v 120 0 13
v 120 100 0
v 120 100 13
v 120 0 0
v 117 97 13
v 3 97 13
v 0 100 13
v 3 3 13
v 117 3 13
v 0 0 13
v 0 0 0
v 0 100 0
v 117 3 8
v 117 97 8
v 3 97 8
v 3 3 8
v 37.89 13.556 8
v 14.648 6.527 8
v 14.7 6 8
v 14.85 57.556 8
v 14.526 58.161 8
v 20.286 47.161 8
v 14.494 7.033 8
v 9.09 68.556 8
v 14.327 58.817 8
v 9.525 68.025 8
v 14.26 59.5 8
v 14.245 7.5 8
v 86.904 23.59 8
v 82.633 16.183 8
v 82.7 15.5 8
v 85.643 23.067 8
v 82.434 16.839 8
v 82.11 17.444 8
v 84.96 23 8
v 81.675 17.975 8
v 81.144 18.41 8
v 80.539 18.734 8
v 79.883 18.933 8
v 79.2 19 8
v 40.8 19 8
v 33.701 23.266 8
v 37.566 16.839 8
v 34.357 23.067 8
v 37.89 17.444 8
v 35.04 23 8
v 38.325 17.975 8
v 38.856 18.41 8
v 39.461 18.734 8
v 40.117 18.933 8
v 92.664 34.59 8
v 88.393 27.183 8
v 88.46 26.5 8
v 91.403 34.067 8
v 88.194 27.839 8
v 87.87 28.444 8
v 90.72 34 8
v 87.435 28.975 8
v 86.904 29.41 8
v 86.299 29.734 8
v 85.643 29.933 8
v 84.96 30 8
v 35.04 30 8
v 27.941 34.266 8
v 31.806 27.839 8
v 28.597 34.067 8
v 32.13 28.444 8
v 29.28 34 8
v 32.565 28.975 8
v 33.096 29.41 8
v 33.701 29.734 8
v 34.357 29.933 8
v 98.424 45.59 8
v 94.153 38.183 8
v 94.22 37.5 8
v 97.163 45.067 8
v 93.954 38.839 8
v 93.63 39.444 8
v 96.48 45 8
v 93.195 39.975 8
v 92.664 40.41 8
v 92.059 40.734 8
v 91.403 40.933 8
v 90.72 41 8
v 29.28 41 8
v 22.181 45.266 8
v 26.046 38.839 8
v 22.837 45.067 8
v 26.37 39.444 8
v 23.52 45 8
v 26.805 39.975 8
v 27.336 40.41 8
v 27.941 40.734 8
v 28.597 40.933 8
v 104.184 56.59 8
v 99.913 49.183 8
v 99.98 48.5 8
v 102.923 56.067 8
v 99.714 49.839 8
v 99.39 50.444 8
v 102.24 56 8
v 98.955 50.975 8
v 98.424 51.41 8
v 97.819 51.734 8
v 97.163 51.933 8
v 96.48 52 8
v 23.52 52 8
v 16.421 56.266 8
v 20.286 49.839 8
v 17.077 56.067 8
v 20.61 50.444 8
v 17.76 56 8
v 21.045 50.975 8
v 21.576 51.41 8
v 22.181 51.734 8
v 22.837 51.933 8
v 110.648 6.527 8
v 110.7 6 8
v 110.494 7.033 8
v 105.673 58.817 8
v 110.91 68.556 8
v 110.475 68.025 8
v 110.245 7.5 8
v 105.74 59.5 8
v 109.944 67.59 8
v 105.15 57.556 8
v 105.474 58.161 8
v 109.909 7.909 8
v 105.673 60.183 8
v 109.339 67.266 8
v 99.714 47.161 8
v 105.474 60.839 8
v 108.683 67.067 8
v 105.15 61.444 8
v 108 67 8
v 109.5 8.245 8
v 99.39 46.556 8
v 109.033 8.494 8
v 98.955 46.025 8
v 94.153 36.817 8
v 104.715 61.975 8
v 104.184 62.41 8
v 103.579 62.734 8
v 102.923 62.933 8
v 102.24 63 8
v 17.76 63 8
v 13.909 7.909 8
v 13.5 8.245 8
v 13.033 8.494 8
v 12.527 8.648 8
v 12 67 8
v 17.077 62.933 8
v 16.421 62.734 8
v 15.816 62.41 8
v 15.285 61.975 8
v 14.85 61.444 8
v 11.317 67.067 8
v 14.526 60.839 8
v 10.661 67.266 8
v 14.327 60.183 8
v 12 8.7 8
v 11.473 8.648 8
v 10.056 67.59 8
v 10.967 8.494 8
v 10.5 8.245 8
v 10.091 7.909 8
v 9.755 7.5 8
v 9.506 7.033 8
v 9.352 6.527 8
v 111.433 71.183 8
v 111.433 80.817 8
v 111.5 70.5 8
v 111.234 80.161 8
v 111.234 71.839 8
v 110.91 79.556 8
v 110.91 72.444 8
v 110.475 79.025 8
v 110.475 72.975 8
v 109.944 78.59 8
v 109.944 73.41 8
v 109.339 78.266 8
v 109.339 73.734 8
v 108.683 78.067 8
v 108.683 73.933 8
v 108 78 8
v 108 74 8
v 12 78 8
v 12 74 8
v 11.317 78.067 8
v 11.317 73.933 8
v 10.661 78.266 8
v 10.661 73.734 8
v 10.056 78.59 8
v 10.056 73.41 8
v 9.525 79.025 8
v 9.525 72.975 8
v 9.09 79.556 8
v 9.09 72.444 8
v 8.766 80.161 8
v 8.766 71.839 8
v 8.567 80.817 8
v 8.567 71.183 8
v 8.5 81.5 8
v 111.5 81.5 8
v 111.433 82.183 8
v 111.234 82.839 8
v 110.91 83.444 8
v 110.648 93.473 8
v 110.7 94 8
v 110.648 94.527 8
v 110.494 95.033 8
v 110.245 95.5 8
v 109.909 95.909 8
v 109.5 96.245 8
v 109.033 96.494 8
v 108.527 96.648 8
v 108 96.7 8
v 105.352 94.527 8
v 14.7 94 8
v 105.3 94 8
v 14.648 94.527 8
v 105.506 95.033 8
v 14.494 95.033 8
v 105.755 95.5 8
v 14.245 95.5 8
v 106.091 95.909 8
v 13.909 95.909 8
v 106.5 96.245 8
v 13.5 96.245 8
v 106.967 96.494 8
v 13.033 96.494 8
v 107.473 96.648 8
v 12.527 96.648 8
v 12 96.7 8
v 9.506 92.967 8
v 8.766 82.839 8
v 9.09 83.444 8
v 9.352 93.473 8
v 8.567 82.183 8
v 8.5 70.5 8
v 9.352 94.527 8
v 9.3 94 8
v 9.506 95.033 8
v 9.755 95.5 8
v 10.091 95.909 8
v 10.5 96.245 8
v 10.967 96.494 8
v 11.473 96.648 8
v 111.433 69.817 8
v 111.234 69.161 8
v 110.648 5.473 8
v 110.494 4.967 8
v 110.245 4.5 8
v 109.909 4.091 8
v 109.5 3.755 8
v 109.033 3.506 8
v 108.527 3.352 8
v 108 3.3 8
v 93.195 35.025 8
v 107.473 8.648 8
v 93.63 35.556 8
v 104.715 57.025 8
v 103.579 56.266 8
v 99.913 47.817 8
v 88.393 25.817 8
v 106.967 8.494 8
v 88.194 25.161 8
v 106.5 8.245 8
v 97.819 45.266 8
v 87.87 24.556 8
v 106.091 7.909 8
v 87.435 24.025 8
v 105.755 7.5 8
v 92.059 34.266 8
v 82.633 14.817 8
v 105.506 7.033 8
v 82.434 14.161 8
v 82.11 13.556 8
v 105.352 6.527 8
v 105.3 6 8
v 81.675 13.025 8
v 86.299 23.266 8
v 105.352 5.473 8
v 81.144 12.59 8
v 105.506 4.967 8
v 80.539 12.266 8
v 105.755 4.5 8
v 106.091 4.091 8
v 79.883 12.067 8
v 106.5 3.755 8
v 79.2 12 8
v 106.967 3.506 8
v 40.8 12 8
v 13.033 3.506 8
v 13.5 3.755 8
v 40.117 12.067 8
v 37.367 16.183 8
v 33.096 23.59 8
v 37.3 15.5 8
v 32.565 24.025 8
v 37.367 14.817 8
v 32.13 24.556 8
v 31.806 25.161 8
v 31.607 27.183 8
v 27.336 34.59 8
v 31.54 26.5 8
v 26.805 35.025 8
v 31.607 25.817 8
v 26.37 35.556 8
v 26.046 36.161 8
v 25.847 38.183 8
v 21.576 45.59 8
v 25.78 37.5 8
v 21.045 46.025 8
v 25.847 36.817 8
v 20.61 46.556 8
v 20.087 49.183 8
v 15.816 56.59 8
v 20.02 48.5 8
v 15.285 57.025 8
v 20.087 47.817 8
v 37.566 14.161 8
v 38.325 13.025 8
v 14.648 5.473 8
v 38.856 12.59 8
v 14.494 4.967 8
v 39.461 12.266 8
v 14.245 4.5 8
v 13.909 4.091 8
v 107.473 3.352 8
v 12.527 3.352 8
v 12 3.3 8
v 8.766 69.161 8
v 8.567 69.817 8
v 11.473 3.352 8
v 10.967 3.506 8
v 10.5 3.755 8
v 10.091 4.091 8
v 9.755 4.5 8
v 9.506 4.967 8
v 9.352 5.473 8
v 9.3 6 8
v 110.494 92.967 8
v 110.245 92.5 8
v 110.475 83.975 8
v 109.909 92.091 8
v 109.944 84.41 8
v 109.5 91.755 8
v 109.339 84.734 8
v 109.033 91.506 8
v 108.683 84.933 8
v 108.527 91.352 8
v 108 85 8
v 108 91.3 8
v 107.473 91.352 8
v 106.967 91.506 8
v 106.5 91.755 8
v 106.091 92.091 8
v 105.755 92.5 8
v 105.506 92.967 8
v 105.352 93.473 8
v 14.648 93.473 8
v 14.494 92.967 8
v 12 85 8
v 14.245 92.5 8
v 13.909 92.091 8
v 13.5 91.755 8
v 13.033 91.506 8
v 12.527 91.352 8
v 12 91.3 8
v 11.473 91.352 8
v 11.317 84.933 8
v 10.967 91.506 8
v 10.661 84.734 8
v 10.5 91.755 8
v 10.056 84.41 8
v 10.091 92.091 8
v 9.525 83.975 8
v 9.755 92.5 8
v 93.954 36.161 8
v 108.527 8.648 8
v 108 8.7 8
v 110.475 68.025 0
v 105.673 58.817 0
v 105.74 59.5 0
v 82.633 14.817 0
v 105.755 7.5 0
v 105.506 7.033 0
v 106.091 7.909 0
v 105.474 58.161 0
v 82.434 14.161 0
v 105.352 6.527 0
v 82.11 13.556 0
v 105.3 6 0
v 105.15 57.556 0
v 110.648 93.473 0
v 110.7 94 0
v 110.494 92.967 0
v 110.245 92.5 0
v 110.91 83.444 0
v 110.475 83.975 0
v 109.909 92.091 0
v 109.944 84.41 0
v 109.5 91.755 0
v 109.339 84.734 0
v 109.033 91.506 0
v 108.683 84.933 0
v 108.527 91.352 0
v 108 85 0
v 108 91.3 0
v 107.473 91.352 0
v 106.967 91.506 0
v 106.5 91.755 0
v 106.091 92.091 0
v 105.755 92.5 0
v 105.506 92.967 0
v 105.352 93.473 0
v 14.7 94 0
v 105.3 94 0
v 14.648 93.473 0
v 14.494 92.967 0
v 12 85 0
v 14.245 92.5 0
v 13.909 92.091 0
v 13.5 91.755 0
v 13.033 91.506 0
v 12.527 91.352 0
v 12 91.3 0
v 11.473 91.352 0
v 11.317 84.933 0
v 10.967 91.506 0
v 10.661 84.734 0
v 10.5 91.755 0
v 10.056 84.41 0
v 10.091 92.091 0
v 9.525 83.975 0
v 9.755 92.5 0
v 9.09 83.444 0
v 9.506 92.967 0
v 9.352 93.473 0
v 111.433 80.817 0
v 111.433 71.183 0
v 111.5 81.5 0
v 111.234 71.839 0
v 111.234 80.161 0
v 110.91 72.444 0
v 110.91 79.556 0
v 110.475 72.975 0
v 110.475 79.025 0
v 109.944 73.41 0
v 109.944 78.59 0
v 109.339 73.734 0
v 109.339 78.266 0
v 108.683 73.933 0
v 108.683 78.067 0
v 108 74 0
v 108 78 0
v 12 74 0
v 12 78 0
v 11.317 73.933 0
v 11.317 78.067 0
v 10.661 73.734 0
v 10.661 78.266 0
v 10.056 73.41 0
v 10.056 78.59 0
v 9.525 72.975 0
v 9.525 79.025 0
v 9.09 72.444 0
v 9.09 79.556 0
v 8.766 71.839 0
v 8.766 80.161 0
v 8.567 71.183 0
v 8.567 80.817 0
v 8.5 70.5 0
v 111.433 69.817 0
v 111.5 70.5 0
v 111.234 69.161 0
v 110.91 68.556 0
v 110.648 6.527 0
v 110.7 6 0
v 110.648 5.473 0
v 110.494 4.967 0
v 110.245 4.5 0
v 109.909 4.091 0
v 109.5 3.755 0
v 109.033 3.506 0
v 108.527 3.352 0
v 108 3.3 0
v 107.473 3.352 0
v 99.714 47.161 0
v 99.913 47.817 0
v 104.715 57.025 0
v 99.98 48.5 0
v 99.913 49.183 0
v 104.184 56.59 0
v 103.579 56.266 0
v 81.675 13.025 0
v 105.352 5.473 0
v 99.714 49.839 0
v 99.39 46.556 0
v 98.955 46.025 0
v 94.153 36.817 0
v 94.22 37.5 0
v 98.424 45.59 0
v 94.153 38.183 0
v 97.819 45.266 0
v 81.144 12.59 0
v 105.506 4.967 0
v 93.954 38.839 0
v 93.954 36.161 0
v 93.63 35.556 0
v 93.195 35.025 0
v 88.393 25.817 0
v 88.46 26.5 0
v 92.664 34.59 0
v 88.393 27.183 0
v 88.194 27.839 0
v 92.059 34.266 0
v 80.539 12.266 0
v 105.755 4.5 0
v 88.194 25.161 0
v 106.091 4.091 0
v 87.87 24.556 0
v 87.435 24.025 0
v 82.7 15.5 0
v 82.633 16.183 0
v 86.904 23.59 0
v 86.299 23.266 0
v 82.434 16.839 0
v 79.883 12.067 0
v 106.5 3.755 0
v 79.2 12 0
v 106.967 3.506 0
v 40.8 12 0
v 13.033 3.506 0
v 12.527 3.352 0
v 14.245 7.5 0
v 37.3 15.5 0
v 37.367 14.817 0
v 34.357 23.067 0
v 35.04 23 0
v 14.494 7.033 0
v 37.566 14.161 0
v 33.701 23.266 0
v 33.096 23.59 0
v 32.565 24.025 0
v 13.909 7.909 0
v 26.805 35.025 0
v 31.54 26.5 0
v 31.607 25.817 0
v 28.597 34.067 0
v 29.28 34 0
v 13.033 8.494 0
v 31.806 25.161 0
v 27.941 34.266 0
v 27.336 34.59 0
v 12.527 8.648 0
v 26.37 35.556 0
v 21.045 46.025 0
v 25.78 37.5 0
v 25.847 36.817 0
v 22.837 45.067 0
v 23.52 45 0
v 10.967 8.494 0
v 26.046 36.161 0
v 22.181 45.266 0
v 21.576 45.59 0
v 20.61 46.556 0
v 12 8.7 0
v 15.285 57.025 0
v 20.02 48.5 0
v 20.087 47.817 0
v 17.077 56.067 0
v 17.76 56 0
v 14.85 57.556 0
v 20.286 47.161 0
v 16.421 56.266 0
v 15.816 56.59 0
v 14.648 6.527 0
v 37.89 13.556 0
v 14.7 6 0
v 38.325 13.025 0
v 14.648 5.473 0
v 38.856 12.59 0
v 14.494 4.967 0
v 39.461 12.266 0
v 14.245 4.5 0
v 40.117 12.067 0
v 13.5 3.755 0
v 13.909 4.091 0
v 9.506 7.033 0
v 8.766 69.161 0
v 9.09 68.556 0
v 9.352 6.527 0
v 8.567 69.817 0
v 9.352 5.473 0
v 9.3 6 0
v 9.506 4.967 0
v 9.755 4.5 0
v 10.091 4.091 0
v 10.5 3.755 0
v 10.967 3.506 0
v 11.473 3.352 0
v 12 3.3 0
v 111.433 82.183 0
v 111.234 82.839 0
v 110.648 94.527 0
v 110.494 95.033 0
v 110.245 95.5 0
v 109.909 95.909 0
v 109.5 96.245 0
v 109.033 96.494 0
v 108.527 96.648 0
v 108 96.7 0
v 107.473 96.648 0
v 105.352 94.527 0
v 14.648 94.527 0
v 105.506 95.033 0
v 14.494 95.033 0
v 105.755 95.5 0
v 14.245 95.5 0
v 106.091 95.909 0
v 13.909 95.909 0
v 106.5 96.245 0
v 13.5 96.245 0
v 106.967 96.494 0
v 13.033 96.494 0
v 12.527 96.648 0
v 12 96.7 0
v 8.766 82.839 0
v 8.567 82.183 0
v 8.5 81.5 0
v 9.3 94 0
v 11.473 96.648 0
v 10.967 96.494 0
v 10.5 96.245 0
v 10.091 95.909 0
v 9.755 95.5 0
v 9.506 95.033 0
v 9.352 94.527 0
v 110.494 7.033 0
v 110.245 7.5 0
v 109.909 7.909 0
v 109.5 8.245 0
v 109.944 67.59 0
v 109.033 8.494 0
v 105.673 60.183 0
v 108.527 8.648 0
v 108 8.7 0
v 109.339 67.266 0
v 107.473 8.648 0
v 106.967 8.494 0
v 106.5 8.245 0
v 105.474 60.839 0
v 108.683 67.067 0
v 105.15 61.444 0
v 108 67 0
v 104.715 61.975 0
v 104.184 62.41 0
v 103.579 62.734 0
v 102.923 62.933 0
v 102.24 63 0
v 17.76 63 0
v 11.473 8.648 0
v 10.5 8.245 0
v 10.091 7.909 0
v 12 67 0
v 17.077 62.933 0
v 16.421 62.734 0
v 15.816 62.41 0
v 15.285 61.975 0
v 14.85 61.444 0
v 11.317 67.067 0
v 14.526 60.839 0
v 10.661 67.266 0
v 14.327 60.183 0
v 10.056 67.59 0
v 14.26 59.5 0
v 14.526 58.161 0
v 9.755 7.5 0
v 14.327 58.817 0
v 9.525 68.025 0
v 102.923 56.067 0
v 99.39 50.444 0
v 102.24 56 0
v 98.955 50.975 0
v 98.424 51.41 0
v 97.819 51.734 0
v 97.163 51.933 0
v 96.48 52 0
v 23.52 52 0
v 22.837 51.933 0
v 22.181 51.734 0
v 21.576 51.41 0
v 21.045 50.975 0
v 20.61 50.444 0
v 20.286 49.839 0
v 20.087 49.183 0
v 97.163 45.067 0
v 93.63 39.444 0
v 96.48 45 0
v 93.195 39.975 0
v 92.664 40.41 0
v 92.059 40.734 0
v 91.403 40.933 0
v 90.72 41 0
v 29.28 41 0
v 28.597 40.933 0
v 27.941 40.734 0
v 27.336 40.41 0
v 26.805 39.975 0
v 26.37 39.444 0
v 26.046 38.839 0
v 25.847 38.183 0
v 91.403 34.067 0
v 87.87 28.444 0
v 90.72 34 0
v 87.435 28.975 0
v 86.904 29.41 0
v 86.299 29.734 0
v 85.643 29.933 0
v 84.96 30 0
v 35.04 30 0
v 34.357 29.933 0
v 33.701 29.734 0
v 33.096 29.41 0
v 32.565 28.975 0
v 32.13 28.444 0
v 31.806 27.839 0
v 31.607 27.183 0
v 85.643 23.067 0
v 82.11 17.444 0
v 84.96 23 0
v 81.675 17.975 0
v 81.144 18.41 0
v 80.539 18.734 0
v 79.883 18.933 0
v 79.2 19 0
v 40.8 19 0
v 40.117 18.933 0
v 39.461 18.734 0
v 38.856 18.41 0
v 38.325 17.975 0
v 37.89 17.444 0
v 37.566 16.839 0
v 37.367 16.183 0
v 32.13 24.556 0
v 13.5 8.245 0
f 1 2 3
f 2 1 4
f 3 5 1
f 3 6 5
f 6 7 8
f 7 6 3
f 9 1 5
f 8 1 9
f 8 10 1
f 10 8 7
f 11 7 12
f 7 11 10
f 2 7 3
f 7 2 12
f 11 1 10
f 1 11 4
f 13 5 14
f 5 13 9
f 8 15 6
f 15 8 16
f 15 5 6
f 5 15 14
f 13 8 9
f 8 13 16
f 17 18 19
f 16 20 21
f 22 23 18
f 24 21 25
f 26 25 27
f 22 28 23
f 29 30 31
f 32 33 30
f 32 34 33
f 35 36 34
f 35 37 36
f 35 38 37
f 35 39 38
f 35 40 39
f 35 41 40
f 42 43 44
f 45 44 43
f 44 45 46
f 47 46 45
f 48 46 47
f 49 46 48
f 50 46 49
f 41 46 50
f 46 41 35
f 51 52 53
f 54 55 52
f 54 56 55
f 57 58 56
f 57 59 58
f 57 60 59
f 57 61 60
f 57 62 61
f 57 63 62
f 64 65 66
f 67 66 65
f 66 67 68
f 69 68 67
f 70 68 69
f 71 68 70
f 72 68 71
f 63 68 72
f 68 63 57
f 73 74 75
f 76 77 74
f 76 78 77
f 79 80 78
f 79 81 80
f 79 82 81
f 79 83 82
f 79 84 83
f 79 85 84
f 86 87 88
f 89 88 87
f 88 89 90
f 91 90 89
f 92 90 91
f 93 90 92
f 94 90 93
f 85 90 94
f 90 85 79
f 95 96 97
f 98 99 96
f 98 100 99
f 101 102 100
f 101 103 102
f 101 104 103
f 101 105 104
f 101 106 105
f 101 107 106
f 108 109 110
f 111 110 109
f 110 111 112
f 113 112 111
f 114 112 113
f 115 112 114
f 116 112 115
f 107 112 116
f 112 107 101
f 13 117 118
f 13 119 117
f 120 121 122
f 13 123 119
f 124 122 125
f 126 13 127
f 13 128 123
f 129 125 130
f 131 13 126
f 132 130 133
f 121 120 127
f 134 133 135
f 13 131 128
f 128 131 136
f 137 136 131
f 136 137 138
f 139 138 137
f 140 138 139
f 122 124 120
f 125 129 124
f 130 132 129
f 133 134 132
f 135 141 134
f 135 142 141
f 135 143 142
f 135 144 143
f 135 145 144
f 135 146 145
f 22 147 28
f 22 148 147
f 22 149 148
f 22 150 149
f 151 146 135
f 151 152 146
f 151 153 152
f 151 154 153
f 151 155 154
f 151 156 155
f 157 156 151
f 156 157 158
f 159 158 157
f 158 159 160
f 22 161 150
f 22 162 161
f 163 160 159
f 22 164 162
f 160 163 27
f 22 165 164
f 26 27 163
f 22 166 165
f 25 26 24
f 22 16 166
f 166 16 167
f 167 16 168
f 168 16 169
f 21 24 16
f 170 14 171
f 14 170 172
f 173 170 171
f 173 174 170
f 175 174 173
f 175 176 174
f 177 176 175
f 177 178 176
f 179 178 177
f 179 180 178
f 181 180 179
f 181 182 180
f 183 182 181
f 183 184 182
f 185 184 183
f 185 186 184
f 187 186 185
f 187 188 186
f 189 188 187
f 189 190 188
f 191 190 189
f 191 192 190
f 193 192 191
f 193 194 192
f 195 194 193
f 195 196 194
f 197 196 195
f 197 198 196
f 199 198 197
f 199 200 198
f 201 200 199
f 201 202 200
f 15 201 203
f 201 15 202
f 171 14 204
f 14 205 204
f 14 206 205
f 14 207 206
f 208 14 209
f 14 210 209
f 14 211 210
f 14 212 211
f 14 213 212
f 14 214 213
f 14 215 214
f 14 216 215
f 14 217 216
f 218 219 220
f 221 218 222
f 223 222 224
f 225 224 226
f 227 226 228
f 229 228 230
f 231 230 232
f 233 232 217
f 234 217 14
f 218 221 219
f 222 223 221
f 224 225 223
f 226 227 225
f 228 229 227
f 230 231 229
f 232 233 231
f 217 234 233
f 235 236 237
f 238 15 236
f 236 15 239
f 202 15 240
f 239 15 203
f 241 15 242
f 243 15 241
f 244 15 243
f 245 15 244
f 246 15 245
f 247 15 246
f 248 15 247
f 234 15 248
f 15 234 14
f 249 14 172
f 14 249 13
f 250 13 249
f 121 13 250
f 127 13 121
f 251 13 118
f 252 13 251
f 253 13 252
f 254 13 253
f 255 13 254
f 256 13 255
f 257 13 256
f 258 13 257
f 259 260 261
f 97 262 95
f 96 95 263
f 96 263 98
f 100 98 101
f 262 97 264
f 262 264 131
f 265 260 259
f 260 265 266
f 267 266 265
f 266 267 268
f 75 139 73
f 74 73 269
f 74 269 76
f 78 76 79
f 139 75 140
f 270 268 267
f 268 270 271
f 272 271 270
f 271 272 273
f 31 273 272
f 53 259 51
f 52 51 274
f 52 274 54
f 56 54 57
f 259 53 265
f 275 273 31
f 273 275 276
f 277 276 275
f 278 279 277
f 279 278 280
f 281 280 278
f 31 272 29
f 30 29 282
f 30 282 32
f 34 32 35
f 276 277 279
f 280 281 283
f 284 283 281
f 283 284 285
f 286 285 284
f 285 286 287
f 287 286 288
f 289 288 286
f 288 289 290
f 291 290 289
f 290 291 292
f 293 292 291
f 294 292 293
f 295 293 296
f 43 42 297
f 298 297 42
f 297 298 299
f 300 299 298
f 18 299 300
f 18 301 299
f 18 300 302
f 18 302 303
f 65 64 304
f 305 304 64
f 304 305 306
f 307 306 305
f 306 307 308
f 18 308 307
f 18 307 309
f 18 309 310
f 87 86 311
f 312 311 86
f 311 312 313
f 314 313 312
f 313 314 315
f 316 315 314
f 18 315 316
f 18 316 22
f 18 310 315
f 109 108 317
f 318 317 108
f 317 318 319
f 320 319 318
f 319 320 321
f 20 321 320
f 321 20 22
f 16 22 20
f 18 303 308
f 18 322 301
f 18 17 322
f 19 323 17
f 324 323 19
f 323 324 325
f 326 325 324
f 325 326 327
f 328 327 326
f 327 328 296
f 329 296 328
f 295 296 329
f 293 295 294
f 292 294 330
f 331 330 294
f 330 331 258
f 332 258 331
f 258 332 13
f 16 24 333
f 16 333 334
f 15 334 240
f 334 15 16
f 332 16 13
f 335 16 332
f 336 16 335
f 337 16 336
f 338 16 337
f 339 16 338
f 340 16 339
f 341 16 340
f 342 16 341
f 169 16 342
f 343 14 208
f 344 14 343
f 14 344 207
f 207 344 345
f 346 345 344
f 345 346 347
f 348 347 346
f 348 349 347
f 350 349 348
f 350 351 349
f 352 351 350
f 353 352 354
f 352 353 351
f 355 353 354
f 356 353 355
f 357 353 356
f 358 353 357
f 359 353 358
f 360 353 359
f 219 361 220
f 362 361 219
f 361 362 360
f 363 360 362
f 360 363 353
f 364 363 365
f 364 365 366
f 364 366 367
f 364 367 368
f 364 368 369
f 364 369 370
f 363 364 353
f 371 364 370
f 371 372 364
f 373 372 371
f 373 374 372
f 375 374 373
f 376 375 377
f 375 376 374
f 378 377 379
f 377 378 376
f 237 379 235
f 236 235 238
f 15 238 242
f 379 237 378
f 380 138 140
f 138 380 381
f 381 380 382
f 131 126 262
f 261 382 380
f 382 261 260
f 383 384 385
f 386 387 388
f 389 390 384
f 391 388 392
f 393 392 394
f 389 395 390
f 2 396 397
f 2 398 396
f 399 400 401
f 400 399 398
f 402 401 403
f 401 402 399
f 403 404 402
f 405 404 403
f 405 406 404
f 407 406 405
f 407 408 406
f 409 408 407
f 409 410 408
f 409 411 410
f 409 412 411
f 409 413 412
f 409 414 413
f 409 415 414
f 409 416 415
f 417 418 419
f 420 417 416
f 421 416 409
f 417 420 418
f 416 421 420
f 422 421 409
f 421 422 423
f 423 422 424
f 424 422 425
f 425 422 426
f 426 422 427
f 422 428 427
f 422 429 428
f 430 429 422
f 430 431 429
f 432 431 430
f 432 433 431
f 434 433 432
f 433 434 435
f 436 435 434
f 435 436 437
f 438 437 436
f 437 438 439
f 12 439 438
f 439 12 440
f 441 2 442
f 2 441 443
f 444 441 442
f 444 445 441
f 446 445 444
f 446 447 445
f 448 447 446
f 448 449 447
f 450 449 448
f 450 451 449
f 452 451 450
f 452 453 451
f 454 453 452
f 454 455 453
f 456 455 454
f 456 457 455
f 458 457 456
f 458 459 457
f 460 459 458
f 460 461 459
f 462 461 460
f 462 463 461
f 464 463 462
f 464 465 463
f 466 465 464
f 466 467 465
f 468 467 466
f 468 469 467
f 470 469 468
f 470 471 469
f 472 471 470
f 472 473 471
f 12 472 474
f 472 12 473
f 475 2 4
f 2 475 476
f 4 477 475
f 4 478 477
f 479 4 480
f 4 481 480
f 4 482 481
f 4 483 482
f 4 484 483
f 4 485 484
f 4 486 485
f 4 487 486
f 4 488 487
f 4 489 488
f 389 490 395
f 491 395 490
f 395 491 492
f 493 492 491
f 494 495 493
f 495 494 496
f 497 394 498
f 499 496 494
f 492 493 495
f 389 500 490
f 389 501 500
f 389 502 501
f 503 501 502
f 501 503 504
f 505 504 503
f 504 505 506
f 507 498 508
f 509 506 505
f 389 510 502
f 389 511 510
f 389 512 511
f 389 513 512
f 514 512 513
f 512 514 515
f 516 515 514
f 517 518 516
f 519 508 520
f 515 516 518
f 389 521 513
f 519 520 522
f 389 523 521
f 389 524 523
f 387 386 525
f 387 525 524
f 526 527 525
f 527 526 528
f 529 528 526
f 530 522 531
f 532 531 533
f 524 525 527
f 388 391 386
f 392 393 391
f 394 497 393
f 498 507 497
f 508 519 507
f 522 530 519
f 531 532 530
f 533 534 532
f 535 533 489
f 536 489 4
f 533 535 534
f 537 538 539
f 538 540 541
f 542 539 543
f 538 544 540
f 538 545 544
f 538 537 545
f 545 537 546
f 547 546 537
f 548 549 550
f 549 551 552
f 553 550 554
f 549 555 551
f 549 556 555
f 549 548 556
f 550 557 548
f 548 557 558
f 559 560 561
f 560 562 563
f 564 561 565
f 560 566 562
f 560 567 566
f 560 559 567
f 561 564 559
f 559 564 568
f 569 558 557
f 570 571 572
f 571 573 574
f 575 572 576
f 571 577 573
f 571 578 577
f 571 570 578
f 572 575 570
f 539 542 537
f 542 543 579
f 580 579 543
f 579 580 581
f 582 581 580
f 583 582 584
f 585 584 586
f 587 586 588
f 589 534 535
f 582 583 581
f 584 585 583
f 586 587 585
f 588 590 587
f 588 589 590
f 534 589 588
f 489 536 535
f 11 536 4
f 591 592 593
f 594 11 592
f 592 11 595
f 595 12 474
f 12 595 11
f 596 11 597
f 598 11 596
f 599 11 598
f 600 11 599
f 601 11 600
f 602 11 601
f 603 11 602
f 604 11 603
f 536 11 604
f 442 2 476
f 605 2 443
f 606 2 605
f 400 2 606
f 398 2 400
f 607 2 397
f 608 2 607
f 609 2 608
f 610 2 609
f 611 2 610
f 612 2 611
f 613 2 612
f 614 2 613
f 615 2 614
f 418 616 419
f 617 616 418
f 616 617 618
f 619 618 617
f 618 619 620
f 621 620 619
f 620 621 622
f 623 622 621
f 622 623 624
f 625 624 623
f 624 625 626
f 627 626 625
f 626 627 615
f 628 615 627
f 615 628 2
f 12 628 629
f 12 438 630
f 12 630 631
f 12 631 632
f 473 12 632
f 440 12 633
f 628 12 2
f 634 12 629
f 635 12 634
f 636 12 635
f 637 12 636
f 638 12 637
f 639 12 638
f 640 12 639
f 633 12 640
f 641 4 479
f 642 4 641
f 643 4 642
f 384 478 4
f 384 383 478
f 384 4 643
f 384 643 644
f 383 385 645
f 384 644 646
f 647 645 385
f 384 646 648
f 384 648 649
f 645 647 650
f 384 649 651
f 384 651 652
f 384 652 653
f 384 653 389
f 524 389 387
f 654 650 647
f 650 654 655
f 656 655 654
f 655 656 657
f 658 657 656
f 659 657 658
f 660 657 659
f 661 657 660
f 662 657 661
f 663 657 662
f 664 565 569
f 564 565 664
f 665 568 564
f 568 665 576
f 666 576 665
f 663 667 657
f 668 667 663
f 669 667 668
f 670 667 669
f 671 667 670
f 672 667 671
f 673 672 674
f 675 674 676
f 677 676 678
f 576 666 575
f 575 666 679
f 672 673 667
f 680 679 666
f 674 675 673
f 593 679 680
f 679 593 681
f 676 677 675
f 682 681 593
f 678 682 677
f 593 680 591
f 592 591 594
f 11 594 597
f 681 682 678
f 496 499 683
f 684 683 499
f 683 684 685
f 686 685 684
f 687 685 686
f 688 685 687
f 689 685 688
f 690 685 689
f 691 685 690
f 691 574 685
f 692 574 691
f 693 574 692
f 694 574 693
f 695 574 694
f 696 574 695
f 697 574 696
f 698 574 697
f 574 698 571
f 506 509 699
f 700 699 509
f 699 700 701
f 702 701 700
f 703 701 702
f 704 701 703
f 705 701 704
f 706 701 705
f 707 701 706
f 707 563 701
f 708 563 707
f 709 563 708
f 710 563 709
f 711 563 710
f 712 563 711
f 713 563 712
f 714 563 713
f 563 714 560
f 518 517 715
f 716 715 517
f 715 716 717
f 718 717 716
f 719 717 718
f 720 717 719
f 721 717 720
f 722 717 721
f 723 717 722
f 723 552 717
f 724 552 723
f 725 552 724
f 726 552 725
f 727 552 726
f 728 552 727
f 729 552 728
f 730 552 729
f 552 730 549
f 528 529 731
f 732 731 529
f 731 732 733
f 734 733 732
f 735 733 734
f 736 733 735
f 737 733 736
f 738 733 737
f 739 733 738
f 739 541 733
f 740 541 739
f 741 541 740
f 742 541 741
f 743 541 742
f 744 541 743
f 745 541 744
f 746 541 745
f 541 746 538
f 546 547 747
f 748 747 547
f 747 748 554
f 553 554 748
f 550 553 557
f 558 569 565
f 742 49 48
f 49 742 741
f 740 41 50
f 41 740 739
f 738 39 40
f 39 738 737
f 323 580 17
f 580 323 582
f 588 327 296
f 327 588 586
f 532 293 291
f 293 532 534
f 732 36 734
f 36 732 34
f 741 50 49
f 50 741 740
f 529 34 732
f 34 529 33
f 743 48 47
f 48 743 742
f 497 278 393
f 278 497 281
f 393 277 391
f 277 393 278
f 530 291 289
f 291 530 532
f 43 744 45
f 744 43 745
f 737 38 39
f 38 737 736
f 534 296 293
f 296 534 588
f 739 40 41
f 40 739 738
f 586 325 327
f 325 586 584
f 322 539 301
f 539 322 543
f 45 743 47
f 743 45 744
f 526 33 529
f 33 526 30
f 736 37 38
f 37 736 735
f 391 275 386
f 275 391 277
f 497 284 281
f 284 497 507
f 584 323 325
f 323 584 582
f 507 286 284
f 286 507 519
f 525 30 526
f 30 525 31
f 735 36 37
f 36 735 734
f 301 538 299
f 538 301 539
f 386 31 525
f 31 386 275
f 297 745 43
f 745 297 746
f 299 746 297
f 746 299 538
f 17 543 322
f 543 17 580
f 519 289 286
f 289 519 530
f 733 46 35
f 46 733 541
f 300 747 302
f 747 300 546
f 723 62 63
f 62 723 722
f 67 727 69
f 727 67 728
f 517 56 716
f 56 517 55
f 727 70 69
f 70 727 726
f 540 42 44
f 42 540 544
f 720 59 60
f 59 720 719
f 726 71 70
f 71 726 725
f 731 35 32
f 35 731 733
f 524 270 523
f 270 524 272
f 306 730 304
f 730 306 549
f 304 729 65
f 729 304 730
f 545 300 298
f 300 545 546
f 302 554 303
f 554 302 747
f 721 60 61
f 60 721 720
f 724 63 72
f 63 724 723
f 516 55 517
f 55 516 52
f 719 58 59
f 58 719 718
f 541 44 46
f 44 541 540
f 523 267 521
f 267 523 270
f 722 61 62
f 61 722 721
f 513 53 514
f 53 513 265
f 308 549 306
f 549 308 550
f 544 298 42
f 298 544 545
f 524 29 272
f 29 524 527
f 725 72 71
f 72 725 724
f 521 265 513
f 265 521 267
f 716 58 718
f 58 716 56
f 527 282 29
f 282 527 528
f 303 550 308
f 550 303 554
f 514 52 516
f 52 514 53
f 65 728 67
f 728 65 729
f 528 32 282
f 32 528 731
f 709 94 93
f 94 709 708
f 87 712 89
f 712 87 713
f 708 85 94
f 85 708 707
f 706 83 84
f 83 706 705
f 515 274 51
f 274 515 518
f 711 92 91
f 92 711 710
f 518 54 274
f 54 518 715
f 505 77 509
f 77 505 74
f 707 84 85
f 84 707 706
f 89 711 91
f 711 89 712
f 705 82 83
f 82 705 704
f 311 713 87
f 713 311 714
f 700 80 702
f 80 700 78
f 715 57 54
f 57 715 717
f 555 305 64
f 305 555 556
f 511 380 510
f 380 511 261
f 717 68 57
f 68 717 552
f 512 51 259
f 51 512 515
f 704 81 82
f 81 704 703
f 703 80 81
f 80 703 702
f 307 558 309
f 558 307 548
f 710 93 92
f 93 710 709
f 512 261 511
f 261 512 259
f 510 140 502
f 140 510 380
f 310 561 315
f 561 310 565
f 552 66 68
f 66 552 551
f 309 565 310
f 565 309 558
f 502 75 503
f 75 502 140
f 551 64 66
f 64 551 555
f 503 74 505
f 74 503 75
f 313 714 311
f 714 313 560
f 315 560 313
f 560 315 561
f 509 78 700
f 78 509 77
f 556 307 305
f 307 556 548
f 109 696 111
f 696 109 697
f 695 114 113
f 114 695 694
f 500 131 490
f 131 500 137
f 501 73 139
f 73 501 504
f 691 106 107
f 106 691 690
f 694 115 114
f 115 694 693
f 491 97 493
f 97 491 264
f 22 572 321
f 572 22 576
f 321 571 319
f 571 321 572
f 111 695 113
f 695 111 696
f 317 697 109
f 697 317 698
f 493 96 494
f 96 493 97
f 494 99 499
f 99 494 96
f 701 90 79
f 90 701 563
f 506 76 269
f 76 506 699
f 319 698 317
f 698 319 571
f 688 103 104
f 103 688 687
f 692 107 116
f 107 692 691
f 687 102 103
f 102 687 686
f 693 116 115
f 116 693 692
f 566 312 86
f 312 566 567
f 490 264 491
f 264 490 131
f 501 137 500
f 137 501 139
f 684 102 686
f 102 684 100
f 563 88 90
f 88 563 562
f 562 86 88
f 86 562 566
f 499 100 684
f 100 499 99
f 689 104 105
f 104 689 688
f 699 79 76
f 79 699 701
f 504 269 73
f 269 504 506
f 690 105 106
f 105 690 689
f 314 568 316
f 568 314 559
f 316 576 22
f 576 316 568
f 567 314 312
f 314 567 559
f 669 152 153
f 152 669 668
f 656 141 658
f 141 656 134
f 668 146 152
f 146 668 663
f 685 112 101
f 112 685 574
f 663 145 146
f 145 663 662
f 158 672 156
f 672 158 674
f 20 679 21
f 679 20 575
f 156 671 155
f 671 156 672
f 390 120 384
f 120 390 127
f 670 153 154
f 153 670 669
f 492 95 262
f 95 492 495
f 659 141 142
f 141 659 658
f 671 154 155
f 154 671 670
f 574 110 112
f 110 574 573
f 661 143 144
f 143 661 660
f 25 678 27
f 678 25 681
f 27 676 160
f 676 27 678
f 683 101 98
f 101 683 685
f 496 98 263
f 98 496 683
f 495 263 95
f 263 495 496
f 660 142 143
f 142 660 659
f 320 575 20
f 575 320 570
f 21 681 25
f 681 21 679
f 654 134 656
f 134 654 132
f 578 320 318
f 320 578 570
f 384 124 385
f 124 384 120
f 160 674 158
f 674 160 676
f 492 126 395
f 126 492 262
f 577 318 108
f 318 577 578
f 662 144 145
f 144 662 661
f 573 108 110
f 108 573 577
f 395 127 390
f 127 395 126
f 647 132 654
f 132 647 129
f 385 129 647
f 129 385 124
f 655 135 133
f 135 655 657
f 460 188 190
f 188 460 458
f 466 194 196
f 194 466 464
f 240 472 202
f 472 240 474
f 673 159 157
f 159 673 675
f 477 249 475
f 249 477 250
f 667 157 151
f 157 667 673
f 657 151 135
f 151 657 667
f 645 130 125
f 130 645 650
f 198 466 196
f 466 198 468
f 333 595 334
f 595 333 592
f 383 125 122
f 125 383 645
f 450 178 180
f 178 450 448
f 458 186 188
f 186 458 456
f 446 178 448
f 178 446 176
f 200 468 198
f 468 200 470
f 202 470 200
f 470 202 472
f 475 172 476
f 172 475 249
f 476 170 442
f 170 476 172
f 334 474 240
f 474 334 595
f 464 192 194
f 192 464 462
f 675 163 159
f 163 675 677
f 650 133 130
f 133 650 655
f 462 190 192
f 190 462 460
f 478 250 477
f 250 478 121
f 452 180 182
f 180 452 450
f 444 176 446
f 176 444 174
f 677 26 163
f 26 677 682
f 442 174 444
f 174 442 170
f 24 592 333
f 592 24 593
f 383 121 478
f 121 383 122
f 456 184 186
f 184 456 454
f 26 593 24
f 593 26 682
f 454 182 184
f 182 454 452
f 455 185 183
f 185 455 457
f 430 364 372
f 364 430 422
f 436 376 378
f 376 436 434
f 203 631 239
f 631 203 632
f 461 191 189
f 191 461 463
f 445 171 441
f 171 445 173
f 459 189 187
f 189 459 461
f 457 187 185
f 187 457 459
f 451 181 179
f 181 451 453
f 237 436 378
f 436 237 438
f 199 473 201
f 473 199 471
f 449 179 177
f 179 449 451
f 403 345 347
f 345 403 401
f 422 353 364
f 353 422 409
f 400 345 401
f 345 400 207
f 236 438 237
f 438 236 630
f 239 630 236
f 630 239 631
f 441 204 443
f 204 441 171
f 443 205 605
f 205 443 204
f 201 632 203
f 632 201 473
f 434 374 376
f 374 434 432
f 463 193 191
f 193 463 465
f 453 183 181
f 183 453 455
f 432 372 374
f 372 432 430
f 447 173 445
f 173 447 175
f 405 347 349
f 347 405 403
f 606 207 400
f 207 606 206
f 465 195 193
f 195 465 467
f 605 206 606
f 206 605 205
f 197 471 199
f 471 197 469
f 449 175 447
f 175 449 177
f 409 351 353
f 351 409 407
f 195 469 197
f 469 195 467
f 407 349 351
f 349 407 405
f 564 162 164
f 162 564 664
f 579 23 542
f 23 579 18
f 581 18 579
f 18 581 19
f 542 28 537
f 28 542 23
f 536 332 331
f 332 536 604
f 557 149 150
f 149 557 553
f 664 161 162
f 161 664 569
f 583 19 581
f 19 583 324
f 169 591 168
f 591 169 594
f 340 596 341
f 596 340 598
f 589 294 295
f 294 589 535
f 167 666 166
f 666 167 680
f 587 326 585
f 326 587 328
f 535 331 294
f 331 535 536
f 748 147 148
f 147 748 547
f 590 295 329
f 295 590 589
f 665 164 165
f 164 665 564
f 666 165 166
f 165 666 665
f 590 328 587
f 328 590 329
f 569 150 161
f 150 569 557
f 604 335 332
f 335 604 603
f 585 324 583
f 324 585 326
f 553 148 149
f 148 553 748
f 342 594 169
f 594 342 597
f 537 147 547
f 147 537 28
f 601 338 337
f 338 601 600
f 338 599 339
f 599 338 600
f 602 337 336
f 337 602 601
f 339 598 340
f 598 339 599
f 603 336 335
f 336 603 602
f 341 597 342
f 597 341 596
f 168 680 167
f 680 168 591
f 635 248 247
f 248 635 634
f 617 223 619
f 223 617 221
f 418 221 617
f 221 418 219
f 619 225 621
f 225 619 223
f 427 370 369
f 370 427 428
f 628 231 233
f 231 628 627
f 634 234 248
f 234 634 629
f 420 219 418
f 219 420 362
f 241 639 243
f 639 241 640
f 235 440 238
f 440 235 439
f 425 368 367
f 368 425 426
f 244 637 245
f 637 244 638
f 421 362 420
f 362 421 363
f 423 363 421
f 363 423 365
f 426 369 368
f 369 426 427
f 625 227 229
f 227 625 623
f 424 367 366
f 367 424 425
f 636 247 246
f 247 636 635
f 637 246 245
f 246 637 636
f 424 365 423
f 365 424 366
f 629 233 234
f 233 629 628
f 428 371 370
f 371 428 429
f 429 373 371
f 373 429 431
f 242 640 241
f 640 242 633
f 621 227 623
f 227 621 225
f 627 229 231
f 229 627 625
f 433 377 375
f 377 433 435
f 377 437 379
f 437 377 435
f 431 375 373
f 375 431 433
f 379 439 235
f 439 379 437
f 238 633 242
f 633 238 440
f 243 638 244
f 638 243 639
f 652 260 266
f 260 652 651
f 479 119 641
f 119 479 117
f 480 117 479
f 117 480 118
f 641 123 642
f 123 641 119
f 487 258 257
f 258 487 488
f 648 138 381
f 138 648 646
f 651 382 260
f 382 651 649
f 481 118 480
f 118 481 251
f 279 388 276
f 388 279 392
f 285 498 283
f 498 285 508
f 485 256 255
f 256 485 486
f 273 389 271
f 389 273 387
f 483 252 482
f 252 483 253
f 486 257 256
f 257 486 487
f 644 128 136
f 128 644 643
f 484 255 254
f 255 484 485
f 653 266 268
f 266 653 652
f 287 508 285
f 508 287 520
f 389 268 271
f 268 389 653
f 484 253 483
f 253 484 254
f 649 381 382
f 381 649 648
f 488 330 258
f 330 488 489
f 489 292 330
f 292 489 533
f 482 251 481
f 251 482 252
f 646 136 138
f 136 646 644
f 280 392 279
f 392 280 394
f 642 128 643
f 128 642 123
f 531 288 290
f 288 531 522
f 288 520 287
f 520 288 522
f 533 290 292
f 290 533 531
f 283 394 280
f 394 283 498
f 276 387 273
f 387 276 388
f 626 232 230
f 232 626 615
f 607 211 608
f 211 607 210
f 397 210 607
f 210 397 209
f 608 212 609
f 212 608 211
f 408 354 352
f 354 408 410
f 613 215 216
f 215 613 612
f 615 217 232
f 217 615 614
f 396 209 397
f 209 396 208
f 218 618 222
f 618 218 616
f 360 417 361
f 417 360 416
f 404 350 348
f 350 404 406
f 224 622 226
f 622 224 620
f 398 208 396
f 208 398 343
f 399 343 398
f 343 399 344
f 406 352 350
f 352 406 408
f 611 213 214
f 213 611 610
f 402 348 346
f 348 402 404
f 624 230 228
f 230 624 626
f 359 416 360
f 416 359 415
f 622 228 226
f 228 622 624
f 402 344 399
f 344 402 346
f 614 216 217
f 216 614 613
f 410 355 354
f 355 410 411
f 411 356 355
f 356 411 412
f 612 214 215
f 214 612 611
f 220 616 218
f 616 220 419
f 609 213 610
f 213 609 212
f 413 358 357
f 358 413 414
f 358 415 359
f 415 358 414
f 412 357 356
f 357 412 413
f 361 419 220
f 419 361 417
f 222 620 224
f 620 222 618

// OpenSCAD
$fn = 32;

// ----------------------------------------------------------------------
// Slotted panel: 120 x 100 mm, 7 рядов of slots
// ----------------------------------------------------------------------

// --- parameters (mm) ---
panel_w = 120;            // panel width
panel_d = 100;            // panel depth
thick = 8;                // panel thickness
slot_w = 7;               // slot width
pitch0 = 11;              // first row pitch
pitch_step = 1.8;         // pitch increase per row
margin = 12;              // margin around the slot field
rows = 7;                 // number of slot rows
mount_d = 5.4;            // mounting holes
mount_x = 48;             // mounting hole offset
rim_h = 13;               // rim height
rim_t = 3;                // rim wall thickness

difference() {
  union() {
    cube([panel_w, panel_d, thick]);
    translate([0, 0, thick - 1]) difference() {
      cube([panel_w, panel_d, rim_h - thick + 1]);
      translate([rim_t, rim_t, -2.5]) cube([panel_w - 2 * rim_t, panel_d - 2 * rim_t, rim_h - thick + 6]);
    }
  }
  /* slot rows: stadium shaped cutters, 2.5 mm clear of both faces */
  /* row 0: pitch 11, length 38.4 */
  hull() {
    translate([40.8, 15.5, -2.5]) cylinder(h = thick + 5, d = slot_w);
    translate([79.2, 15.5, -2.5]) cylinder(h = thick + 5, d = slot_w);
  }
  /* row 1: pitch 11, length 49.92 */
  hull() {
    translate([35.04, 26.5, -2.5]) cylinder(h = thick + 5, d = slot_w);
    translate([84.96, 26.5, -2.5]) cylinder(h = thick + 5, d = slot_w);
  }
  /* row 2: pitch 11, length 61.44 */
  hull() {
    translate([29.28, 37.5, -2.5]) cylinder(h = thick + 5, d = slot_w);
    translate([90.72, 37.5, -2.5]) cylinder(h = thick + 5, d = slot_w);
  }
  /* row 3: pitch 11, length 72.96 */
  hull() {
    translate([23.52, 48.5, -2.5]) cylinder(h = thick + 5, d = slot_w);
    translate([96.48, 48.5, -2.5]) cylinder(h = thick + 5, d = slot_w);
  }
  /* row 4: pitch 11, length 84.48 */
  hull() {
    translate([17.76, 59.5, -2.5]) cylinder(h = thick + 5, d = slot_w);
    translate([102.24, 59.5, -2.5]) cylinder(h = thick + 5, d = slot_w);
  }
  /* row 5: pitch 11, length 96 */
  hull() {
    translate([12, 70.5, -2.5]) cylinder(h = thick + 5, d = slot_w);
    translate([108, 70.5, -2.5]) cylinder(h = thick + 5, d = slot_w);
  }
  /* row 6: pitch 11, length 96 */
  hull() {
    translate([12, 81.5, -2.5]) cylinder(h = thick + 5, d = slot_w);
    translate([108, 81.5, -2.5]) cylinder(h = thick + 5, d = slot_w);
  }
  translate([12, 6, -2.5]) cylinder(h = 18, d = mount_d);
  translate([12, 94, -2.5]) cylinder(h = 18, d = mount_d);
  translate([108, 6, -2.5]) cylinder(h = 18, d = mount_d);
  translate([108, 94, -2.5]) cylinder(h = 18, d = mount_d);
}
